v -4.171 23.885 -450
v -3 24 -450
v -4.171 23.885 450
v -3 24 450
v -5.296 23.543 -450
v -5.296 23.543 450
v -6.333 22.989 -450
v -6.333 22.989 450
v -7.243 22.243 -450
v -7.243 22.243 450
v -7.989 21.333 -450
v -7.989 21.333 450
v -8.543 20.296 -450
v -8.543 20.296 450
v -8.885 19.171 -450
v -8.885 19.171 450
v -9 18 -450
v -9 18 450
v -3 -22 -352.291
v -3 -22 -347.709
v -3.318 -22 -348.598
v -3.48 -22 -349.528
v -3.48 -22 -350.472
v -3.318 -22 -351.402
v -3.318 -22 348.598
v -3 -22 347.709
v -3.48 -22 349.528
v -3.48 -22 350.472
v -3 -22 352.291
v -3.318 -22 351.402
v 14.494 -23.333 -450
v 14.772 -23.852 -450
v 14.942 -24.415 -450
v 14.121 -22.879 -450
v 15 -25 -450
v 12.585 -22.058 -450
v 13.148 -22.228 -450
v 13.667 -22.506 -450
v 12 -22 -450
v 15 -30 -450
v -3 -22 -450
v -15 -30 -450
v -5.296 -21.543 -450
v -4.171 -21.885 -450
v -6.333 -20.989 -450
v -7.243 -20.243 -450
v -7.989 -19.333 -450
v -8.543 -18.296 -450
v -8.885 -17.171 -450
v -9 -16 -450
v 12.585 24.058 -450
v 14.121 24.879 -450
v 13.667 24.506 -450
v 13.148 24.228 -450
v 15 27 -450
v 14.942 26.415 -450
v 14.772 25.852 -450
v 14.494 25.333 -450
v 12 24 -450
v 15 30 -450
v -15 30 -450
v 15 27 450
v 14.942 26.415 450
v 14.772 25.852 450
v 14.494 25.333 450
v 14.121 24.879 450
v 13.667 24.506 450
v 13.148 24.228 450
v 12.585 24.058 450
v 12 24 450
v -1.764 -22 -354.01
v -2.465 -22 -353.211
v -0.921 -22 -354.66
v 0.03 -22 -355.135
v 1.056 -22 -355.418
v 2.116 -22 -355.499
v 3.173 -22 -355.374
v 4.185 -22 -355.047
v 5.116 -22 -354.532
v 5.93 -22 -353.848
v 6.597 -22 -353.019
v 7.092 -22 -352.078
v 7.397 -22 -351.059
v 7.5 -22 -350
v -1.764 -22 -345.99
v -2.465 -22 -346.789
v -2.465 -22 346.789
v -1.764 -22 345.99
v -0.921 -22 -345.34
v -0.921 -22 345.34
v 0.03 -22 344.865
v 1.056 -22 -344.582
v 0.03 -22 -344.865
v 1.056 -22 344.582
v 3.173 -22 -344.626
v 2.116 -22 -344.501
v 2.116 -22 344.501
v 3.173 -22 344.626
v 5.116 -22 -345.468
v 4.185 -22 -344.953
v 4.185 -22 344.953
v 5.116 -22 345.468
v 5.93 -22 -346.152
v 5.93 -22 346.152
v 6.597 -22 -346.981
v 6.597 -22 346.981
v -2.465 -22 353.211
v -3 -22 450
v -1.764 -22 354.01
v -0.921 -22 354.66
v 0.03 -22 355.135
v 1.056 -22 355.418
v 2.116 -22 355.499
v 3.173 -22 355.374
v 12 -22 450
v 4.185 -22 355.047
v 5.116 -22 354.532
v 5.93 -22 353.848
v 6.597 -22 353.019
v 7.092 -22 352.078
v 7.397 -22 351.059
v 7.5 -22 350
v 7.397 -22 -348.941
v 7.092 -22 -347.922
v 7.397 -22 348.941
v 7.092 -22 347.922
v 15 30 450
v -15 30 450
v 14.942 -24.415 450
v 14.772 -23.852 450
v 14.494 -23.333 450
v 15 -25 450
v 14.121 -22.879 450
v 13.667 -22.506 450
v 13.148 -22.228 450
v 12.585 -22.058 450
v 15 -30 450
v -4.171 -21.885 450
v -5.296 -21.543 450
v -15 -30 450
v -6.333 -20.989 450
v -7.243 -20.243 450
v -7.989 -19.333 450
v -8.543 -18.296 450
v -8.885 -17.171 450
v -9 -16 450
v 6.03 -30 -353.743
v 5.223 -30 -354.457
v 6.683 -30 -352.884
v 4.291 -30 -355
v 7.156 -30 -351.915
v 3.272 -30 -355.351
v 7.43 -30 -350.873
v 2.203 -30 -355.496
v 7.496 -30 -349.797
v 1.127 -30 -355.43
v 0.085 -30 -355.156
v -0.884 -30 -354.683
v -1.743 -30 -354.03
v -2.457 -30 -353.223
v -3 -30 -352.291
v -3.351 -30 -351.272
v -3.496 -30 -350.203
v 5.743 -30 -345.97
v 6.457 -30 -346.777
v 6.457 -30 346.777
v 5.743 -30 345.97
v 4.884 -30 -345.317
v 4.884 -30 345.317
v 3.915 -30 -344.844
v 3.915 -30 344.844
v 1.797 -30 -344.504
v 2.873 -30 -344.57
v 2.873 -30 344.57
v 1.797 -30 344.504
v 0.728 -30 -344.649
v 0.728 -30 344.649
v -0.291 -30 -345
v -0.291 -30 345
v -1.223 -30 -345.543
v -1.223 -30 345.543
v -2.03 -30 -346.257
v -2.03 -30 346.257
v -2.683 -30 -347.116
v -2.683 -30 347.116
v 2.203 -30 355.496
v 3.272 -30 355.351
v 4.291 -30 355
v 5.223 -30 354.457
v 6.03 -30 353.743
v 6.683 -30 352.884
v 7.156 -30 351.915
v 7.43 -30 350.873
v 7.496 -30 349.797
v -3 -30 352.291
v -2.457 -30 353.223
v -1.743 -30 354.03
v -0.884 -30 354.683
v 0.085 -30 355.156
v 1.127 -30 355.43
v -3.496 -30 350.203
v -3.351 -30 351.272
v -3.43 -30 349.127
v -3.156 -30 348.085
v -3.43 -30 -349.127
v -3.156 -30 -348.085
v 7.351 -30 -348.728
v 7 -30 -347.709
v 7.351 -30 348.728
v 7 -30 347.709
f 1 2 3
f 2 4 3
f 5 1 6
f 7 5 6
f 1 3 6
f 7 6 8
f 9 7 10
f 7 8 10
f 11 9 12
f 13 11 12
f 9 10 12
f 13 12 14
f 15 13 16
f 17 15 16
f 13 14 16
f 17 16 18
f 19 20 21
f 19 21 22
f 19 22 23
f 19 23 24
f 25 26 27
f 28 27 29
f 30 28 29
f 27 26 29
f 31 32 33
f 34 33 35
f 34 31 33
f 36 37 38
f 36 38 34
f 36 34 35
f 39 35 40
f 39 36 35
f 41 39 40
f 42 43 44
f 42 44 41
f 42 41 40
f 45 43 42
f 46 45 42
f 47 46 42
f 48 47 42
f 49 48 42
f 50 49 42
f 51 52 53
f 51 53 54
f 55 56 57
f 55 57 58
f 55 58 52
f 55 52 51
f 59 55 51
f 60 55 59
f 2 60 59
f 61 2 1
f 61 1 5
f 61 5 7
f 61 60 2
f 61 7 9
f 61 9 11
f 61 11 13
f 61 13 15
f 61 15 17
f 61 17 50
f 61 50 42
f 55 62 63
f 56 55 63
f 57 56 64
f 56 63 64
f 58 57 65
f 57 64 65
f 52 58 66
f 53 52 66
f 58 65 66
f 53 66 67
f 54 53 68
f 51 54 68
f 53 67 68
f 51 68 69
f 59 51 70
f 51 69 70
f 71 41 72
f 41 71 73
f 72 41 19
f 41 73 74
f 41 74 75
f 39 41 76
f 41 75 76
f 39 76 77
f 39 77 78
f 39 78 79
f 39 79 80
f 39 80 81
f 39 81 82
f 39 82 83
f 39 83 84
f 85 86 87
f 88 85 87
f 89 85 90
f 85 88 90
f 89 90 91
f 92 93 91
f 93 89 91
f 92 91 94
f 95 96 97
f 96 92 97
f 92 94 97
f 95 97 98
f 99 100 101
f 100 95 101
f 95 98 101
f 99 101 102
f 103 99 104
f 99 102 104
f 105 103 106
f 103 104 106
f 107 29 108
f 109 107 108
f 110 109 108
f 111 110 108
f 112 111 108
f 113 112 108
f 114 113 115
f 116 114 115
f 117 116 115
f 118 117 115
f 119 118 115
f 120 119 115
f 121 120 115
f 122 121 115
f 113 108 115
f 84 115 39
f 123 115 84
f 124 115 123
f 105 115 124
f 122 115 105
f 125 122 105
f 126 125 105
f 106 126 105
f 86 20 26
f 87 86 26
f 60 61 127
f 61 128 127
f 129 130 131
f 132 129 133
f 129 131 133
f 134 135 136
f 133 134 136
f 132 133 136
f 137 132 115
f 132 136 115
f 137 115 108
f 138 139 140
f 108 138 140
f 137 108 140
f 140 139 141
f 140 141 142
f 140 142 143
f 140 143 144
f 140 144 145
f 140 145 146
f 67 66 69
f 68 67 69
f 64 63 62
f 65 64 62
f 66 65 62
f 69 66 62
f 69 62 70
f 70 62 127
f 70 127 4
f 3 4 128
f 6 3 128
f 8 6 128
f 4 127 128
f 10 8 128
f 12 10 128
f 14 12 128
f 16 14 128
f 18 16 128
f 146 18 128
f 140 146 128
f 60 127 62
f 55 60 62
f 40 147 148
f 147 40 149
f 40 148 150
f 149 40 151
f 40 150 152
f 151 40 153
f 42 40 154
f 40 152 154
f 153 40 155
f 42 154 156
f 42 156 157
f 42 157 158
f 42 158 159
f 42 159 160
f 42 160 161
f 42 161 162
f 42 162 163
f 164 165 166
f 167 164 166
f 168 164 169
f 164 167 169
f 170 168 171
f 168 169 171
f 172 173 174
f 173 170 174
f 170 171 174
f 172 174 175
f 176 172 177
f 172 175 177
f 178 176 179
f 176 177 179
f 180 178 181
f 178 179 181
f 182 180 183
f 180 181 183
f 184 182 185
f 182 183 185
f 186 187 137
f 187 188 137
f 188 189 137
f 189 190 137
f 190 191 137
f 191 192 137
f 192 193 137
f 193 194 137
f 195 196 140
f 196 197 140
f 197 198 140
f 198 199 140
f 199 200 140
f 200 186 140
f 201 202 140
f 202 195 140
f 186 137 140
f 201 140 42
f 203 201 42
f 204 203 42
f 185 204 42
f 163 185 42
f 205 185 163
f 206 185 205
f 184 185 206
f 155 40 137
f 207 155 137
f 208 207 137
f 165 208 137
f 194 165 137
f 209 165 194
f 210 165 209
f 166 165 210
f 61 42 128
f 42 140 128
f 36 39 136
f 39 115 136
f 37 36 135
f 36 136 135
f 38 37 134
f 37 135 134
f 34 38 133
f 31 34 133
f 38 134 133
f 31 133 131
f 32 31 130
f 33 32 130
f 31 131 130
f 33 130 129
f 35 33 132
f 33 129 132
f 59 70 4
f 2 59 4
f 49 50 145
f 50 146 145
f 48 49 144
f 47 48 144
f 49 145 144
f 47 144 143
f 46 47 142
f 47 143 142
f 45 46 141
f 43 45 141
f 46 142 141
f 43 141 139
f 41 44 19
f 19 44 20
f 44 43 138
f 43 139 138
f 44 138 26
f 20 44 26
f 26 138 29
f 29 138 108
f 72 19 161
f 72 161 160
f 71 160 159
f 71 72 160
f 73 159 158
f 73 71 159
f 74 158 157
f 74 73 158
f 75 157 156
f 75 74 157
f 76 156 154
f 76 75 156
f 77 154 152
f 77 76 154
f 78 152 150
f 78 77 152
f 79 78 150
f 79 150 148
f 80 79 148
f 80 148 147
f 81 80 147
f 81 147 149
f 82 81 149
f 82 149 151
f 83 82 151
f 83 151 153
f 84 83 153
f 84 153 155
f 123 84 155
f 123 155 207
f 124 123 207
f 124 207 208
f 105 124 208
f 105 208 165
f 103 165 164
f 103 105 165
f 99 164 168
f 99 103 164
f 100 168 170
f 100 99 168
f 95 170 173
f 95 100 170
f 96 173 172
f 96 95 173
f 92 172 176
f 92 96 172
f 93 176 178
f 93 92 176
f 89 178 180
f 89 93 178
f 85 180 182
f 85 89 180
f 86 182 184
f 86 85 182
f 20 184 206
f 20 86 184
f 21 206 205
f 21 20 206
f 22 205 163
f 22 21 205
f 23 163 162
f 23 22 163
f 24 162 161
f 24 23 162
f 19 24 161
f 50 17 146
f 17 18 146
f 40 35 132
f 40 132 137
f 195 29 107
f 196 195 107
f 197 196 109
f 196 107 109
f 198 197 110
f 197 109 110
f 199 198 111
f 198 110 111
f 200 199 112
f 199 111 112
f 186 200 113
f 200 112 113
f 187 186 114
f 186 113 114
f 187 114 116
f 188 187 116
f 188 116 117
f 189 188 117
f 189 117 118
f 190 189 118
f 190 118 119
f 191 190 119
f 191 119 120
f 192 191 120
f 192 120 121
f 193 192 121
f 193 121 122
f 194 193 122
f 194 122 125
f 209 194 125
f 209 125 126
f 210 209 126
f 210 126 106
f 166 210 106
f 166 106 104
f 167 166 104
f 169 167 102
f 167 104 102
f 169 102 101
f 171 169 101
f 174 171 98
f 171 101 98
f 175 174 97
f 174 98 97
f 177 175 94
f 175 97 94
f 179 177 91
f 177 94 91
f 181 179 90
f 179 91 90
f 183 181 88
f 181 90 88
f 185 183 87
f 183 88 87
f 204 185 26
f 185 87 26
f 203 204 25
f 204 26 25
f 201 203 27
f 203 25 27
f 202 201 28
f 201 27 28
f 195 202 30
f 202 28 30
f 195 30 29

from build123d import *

# Parameters (mm, degrees)
BOSS_EXTRUDE1_DEPTH = 450
SKETCH2_R           = 5.5
CUT_EXTRUDE1_DEPTH  = 10


with BuildPart() as part:
    # Sketch1 → Boss-Extrude1 (new, symmetric)
    with BuildSketch(Plane.XY):
        with BuildLine():
            Line((12, 24), (-3, 24))
            ThreePointArc((-3, 24), (-7.242640687, 22.242640687), (-9, 18))
            Line((-9, 18), (-9, -16))
            ThreePointArc((-9, -16), (-7.242640687, -20.242640687), (-3, -22))
            Line((-3, -22), (12, -22))
            ThreePointArc((12, -22), (14.121320344, -22.878679656), (15, -25))
            Line((15, -25), (15, -30))
            Line((15, -30), (-15, -30))
            Line((-15, -30), (-15, 30))
            Line((-15, 30), (15, 30))
            Line((15, 30), (15, 27))
            ThreePointArc((15, 27), (14.121320344, 24.878679656), (12, 24))
        make_face()
    extrude(amount=BOSS_EXTRUDE1_DEPTH, both=True)

    # Sketch2 → Cut-Extrude1 (cut)
    with BuildSketch(Plane(origin=(0, -22, 0), x_dir=(1, 0, 0), z_dir=(0, 1, 0))):
        with Locations(Location((2, -350, 0), (0, 0, 204.619977329))):
            Circle(SKETCH2_R)
    cut_extrude1 = extrude(amount=-CUT_EXTRUDE1_DEPTH, mode=Mode.SUBTRACT)

    # Mirror1: Cut-Extrude1 across plane
    add(cut_extrude1.mirror(Plane.XY), mode=Mode.SUBTRACT)


solid = part.part
